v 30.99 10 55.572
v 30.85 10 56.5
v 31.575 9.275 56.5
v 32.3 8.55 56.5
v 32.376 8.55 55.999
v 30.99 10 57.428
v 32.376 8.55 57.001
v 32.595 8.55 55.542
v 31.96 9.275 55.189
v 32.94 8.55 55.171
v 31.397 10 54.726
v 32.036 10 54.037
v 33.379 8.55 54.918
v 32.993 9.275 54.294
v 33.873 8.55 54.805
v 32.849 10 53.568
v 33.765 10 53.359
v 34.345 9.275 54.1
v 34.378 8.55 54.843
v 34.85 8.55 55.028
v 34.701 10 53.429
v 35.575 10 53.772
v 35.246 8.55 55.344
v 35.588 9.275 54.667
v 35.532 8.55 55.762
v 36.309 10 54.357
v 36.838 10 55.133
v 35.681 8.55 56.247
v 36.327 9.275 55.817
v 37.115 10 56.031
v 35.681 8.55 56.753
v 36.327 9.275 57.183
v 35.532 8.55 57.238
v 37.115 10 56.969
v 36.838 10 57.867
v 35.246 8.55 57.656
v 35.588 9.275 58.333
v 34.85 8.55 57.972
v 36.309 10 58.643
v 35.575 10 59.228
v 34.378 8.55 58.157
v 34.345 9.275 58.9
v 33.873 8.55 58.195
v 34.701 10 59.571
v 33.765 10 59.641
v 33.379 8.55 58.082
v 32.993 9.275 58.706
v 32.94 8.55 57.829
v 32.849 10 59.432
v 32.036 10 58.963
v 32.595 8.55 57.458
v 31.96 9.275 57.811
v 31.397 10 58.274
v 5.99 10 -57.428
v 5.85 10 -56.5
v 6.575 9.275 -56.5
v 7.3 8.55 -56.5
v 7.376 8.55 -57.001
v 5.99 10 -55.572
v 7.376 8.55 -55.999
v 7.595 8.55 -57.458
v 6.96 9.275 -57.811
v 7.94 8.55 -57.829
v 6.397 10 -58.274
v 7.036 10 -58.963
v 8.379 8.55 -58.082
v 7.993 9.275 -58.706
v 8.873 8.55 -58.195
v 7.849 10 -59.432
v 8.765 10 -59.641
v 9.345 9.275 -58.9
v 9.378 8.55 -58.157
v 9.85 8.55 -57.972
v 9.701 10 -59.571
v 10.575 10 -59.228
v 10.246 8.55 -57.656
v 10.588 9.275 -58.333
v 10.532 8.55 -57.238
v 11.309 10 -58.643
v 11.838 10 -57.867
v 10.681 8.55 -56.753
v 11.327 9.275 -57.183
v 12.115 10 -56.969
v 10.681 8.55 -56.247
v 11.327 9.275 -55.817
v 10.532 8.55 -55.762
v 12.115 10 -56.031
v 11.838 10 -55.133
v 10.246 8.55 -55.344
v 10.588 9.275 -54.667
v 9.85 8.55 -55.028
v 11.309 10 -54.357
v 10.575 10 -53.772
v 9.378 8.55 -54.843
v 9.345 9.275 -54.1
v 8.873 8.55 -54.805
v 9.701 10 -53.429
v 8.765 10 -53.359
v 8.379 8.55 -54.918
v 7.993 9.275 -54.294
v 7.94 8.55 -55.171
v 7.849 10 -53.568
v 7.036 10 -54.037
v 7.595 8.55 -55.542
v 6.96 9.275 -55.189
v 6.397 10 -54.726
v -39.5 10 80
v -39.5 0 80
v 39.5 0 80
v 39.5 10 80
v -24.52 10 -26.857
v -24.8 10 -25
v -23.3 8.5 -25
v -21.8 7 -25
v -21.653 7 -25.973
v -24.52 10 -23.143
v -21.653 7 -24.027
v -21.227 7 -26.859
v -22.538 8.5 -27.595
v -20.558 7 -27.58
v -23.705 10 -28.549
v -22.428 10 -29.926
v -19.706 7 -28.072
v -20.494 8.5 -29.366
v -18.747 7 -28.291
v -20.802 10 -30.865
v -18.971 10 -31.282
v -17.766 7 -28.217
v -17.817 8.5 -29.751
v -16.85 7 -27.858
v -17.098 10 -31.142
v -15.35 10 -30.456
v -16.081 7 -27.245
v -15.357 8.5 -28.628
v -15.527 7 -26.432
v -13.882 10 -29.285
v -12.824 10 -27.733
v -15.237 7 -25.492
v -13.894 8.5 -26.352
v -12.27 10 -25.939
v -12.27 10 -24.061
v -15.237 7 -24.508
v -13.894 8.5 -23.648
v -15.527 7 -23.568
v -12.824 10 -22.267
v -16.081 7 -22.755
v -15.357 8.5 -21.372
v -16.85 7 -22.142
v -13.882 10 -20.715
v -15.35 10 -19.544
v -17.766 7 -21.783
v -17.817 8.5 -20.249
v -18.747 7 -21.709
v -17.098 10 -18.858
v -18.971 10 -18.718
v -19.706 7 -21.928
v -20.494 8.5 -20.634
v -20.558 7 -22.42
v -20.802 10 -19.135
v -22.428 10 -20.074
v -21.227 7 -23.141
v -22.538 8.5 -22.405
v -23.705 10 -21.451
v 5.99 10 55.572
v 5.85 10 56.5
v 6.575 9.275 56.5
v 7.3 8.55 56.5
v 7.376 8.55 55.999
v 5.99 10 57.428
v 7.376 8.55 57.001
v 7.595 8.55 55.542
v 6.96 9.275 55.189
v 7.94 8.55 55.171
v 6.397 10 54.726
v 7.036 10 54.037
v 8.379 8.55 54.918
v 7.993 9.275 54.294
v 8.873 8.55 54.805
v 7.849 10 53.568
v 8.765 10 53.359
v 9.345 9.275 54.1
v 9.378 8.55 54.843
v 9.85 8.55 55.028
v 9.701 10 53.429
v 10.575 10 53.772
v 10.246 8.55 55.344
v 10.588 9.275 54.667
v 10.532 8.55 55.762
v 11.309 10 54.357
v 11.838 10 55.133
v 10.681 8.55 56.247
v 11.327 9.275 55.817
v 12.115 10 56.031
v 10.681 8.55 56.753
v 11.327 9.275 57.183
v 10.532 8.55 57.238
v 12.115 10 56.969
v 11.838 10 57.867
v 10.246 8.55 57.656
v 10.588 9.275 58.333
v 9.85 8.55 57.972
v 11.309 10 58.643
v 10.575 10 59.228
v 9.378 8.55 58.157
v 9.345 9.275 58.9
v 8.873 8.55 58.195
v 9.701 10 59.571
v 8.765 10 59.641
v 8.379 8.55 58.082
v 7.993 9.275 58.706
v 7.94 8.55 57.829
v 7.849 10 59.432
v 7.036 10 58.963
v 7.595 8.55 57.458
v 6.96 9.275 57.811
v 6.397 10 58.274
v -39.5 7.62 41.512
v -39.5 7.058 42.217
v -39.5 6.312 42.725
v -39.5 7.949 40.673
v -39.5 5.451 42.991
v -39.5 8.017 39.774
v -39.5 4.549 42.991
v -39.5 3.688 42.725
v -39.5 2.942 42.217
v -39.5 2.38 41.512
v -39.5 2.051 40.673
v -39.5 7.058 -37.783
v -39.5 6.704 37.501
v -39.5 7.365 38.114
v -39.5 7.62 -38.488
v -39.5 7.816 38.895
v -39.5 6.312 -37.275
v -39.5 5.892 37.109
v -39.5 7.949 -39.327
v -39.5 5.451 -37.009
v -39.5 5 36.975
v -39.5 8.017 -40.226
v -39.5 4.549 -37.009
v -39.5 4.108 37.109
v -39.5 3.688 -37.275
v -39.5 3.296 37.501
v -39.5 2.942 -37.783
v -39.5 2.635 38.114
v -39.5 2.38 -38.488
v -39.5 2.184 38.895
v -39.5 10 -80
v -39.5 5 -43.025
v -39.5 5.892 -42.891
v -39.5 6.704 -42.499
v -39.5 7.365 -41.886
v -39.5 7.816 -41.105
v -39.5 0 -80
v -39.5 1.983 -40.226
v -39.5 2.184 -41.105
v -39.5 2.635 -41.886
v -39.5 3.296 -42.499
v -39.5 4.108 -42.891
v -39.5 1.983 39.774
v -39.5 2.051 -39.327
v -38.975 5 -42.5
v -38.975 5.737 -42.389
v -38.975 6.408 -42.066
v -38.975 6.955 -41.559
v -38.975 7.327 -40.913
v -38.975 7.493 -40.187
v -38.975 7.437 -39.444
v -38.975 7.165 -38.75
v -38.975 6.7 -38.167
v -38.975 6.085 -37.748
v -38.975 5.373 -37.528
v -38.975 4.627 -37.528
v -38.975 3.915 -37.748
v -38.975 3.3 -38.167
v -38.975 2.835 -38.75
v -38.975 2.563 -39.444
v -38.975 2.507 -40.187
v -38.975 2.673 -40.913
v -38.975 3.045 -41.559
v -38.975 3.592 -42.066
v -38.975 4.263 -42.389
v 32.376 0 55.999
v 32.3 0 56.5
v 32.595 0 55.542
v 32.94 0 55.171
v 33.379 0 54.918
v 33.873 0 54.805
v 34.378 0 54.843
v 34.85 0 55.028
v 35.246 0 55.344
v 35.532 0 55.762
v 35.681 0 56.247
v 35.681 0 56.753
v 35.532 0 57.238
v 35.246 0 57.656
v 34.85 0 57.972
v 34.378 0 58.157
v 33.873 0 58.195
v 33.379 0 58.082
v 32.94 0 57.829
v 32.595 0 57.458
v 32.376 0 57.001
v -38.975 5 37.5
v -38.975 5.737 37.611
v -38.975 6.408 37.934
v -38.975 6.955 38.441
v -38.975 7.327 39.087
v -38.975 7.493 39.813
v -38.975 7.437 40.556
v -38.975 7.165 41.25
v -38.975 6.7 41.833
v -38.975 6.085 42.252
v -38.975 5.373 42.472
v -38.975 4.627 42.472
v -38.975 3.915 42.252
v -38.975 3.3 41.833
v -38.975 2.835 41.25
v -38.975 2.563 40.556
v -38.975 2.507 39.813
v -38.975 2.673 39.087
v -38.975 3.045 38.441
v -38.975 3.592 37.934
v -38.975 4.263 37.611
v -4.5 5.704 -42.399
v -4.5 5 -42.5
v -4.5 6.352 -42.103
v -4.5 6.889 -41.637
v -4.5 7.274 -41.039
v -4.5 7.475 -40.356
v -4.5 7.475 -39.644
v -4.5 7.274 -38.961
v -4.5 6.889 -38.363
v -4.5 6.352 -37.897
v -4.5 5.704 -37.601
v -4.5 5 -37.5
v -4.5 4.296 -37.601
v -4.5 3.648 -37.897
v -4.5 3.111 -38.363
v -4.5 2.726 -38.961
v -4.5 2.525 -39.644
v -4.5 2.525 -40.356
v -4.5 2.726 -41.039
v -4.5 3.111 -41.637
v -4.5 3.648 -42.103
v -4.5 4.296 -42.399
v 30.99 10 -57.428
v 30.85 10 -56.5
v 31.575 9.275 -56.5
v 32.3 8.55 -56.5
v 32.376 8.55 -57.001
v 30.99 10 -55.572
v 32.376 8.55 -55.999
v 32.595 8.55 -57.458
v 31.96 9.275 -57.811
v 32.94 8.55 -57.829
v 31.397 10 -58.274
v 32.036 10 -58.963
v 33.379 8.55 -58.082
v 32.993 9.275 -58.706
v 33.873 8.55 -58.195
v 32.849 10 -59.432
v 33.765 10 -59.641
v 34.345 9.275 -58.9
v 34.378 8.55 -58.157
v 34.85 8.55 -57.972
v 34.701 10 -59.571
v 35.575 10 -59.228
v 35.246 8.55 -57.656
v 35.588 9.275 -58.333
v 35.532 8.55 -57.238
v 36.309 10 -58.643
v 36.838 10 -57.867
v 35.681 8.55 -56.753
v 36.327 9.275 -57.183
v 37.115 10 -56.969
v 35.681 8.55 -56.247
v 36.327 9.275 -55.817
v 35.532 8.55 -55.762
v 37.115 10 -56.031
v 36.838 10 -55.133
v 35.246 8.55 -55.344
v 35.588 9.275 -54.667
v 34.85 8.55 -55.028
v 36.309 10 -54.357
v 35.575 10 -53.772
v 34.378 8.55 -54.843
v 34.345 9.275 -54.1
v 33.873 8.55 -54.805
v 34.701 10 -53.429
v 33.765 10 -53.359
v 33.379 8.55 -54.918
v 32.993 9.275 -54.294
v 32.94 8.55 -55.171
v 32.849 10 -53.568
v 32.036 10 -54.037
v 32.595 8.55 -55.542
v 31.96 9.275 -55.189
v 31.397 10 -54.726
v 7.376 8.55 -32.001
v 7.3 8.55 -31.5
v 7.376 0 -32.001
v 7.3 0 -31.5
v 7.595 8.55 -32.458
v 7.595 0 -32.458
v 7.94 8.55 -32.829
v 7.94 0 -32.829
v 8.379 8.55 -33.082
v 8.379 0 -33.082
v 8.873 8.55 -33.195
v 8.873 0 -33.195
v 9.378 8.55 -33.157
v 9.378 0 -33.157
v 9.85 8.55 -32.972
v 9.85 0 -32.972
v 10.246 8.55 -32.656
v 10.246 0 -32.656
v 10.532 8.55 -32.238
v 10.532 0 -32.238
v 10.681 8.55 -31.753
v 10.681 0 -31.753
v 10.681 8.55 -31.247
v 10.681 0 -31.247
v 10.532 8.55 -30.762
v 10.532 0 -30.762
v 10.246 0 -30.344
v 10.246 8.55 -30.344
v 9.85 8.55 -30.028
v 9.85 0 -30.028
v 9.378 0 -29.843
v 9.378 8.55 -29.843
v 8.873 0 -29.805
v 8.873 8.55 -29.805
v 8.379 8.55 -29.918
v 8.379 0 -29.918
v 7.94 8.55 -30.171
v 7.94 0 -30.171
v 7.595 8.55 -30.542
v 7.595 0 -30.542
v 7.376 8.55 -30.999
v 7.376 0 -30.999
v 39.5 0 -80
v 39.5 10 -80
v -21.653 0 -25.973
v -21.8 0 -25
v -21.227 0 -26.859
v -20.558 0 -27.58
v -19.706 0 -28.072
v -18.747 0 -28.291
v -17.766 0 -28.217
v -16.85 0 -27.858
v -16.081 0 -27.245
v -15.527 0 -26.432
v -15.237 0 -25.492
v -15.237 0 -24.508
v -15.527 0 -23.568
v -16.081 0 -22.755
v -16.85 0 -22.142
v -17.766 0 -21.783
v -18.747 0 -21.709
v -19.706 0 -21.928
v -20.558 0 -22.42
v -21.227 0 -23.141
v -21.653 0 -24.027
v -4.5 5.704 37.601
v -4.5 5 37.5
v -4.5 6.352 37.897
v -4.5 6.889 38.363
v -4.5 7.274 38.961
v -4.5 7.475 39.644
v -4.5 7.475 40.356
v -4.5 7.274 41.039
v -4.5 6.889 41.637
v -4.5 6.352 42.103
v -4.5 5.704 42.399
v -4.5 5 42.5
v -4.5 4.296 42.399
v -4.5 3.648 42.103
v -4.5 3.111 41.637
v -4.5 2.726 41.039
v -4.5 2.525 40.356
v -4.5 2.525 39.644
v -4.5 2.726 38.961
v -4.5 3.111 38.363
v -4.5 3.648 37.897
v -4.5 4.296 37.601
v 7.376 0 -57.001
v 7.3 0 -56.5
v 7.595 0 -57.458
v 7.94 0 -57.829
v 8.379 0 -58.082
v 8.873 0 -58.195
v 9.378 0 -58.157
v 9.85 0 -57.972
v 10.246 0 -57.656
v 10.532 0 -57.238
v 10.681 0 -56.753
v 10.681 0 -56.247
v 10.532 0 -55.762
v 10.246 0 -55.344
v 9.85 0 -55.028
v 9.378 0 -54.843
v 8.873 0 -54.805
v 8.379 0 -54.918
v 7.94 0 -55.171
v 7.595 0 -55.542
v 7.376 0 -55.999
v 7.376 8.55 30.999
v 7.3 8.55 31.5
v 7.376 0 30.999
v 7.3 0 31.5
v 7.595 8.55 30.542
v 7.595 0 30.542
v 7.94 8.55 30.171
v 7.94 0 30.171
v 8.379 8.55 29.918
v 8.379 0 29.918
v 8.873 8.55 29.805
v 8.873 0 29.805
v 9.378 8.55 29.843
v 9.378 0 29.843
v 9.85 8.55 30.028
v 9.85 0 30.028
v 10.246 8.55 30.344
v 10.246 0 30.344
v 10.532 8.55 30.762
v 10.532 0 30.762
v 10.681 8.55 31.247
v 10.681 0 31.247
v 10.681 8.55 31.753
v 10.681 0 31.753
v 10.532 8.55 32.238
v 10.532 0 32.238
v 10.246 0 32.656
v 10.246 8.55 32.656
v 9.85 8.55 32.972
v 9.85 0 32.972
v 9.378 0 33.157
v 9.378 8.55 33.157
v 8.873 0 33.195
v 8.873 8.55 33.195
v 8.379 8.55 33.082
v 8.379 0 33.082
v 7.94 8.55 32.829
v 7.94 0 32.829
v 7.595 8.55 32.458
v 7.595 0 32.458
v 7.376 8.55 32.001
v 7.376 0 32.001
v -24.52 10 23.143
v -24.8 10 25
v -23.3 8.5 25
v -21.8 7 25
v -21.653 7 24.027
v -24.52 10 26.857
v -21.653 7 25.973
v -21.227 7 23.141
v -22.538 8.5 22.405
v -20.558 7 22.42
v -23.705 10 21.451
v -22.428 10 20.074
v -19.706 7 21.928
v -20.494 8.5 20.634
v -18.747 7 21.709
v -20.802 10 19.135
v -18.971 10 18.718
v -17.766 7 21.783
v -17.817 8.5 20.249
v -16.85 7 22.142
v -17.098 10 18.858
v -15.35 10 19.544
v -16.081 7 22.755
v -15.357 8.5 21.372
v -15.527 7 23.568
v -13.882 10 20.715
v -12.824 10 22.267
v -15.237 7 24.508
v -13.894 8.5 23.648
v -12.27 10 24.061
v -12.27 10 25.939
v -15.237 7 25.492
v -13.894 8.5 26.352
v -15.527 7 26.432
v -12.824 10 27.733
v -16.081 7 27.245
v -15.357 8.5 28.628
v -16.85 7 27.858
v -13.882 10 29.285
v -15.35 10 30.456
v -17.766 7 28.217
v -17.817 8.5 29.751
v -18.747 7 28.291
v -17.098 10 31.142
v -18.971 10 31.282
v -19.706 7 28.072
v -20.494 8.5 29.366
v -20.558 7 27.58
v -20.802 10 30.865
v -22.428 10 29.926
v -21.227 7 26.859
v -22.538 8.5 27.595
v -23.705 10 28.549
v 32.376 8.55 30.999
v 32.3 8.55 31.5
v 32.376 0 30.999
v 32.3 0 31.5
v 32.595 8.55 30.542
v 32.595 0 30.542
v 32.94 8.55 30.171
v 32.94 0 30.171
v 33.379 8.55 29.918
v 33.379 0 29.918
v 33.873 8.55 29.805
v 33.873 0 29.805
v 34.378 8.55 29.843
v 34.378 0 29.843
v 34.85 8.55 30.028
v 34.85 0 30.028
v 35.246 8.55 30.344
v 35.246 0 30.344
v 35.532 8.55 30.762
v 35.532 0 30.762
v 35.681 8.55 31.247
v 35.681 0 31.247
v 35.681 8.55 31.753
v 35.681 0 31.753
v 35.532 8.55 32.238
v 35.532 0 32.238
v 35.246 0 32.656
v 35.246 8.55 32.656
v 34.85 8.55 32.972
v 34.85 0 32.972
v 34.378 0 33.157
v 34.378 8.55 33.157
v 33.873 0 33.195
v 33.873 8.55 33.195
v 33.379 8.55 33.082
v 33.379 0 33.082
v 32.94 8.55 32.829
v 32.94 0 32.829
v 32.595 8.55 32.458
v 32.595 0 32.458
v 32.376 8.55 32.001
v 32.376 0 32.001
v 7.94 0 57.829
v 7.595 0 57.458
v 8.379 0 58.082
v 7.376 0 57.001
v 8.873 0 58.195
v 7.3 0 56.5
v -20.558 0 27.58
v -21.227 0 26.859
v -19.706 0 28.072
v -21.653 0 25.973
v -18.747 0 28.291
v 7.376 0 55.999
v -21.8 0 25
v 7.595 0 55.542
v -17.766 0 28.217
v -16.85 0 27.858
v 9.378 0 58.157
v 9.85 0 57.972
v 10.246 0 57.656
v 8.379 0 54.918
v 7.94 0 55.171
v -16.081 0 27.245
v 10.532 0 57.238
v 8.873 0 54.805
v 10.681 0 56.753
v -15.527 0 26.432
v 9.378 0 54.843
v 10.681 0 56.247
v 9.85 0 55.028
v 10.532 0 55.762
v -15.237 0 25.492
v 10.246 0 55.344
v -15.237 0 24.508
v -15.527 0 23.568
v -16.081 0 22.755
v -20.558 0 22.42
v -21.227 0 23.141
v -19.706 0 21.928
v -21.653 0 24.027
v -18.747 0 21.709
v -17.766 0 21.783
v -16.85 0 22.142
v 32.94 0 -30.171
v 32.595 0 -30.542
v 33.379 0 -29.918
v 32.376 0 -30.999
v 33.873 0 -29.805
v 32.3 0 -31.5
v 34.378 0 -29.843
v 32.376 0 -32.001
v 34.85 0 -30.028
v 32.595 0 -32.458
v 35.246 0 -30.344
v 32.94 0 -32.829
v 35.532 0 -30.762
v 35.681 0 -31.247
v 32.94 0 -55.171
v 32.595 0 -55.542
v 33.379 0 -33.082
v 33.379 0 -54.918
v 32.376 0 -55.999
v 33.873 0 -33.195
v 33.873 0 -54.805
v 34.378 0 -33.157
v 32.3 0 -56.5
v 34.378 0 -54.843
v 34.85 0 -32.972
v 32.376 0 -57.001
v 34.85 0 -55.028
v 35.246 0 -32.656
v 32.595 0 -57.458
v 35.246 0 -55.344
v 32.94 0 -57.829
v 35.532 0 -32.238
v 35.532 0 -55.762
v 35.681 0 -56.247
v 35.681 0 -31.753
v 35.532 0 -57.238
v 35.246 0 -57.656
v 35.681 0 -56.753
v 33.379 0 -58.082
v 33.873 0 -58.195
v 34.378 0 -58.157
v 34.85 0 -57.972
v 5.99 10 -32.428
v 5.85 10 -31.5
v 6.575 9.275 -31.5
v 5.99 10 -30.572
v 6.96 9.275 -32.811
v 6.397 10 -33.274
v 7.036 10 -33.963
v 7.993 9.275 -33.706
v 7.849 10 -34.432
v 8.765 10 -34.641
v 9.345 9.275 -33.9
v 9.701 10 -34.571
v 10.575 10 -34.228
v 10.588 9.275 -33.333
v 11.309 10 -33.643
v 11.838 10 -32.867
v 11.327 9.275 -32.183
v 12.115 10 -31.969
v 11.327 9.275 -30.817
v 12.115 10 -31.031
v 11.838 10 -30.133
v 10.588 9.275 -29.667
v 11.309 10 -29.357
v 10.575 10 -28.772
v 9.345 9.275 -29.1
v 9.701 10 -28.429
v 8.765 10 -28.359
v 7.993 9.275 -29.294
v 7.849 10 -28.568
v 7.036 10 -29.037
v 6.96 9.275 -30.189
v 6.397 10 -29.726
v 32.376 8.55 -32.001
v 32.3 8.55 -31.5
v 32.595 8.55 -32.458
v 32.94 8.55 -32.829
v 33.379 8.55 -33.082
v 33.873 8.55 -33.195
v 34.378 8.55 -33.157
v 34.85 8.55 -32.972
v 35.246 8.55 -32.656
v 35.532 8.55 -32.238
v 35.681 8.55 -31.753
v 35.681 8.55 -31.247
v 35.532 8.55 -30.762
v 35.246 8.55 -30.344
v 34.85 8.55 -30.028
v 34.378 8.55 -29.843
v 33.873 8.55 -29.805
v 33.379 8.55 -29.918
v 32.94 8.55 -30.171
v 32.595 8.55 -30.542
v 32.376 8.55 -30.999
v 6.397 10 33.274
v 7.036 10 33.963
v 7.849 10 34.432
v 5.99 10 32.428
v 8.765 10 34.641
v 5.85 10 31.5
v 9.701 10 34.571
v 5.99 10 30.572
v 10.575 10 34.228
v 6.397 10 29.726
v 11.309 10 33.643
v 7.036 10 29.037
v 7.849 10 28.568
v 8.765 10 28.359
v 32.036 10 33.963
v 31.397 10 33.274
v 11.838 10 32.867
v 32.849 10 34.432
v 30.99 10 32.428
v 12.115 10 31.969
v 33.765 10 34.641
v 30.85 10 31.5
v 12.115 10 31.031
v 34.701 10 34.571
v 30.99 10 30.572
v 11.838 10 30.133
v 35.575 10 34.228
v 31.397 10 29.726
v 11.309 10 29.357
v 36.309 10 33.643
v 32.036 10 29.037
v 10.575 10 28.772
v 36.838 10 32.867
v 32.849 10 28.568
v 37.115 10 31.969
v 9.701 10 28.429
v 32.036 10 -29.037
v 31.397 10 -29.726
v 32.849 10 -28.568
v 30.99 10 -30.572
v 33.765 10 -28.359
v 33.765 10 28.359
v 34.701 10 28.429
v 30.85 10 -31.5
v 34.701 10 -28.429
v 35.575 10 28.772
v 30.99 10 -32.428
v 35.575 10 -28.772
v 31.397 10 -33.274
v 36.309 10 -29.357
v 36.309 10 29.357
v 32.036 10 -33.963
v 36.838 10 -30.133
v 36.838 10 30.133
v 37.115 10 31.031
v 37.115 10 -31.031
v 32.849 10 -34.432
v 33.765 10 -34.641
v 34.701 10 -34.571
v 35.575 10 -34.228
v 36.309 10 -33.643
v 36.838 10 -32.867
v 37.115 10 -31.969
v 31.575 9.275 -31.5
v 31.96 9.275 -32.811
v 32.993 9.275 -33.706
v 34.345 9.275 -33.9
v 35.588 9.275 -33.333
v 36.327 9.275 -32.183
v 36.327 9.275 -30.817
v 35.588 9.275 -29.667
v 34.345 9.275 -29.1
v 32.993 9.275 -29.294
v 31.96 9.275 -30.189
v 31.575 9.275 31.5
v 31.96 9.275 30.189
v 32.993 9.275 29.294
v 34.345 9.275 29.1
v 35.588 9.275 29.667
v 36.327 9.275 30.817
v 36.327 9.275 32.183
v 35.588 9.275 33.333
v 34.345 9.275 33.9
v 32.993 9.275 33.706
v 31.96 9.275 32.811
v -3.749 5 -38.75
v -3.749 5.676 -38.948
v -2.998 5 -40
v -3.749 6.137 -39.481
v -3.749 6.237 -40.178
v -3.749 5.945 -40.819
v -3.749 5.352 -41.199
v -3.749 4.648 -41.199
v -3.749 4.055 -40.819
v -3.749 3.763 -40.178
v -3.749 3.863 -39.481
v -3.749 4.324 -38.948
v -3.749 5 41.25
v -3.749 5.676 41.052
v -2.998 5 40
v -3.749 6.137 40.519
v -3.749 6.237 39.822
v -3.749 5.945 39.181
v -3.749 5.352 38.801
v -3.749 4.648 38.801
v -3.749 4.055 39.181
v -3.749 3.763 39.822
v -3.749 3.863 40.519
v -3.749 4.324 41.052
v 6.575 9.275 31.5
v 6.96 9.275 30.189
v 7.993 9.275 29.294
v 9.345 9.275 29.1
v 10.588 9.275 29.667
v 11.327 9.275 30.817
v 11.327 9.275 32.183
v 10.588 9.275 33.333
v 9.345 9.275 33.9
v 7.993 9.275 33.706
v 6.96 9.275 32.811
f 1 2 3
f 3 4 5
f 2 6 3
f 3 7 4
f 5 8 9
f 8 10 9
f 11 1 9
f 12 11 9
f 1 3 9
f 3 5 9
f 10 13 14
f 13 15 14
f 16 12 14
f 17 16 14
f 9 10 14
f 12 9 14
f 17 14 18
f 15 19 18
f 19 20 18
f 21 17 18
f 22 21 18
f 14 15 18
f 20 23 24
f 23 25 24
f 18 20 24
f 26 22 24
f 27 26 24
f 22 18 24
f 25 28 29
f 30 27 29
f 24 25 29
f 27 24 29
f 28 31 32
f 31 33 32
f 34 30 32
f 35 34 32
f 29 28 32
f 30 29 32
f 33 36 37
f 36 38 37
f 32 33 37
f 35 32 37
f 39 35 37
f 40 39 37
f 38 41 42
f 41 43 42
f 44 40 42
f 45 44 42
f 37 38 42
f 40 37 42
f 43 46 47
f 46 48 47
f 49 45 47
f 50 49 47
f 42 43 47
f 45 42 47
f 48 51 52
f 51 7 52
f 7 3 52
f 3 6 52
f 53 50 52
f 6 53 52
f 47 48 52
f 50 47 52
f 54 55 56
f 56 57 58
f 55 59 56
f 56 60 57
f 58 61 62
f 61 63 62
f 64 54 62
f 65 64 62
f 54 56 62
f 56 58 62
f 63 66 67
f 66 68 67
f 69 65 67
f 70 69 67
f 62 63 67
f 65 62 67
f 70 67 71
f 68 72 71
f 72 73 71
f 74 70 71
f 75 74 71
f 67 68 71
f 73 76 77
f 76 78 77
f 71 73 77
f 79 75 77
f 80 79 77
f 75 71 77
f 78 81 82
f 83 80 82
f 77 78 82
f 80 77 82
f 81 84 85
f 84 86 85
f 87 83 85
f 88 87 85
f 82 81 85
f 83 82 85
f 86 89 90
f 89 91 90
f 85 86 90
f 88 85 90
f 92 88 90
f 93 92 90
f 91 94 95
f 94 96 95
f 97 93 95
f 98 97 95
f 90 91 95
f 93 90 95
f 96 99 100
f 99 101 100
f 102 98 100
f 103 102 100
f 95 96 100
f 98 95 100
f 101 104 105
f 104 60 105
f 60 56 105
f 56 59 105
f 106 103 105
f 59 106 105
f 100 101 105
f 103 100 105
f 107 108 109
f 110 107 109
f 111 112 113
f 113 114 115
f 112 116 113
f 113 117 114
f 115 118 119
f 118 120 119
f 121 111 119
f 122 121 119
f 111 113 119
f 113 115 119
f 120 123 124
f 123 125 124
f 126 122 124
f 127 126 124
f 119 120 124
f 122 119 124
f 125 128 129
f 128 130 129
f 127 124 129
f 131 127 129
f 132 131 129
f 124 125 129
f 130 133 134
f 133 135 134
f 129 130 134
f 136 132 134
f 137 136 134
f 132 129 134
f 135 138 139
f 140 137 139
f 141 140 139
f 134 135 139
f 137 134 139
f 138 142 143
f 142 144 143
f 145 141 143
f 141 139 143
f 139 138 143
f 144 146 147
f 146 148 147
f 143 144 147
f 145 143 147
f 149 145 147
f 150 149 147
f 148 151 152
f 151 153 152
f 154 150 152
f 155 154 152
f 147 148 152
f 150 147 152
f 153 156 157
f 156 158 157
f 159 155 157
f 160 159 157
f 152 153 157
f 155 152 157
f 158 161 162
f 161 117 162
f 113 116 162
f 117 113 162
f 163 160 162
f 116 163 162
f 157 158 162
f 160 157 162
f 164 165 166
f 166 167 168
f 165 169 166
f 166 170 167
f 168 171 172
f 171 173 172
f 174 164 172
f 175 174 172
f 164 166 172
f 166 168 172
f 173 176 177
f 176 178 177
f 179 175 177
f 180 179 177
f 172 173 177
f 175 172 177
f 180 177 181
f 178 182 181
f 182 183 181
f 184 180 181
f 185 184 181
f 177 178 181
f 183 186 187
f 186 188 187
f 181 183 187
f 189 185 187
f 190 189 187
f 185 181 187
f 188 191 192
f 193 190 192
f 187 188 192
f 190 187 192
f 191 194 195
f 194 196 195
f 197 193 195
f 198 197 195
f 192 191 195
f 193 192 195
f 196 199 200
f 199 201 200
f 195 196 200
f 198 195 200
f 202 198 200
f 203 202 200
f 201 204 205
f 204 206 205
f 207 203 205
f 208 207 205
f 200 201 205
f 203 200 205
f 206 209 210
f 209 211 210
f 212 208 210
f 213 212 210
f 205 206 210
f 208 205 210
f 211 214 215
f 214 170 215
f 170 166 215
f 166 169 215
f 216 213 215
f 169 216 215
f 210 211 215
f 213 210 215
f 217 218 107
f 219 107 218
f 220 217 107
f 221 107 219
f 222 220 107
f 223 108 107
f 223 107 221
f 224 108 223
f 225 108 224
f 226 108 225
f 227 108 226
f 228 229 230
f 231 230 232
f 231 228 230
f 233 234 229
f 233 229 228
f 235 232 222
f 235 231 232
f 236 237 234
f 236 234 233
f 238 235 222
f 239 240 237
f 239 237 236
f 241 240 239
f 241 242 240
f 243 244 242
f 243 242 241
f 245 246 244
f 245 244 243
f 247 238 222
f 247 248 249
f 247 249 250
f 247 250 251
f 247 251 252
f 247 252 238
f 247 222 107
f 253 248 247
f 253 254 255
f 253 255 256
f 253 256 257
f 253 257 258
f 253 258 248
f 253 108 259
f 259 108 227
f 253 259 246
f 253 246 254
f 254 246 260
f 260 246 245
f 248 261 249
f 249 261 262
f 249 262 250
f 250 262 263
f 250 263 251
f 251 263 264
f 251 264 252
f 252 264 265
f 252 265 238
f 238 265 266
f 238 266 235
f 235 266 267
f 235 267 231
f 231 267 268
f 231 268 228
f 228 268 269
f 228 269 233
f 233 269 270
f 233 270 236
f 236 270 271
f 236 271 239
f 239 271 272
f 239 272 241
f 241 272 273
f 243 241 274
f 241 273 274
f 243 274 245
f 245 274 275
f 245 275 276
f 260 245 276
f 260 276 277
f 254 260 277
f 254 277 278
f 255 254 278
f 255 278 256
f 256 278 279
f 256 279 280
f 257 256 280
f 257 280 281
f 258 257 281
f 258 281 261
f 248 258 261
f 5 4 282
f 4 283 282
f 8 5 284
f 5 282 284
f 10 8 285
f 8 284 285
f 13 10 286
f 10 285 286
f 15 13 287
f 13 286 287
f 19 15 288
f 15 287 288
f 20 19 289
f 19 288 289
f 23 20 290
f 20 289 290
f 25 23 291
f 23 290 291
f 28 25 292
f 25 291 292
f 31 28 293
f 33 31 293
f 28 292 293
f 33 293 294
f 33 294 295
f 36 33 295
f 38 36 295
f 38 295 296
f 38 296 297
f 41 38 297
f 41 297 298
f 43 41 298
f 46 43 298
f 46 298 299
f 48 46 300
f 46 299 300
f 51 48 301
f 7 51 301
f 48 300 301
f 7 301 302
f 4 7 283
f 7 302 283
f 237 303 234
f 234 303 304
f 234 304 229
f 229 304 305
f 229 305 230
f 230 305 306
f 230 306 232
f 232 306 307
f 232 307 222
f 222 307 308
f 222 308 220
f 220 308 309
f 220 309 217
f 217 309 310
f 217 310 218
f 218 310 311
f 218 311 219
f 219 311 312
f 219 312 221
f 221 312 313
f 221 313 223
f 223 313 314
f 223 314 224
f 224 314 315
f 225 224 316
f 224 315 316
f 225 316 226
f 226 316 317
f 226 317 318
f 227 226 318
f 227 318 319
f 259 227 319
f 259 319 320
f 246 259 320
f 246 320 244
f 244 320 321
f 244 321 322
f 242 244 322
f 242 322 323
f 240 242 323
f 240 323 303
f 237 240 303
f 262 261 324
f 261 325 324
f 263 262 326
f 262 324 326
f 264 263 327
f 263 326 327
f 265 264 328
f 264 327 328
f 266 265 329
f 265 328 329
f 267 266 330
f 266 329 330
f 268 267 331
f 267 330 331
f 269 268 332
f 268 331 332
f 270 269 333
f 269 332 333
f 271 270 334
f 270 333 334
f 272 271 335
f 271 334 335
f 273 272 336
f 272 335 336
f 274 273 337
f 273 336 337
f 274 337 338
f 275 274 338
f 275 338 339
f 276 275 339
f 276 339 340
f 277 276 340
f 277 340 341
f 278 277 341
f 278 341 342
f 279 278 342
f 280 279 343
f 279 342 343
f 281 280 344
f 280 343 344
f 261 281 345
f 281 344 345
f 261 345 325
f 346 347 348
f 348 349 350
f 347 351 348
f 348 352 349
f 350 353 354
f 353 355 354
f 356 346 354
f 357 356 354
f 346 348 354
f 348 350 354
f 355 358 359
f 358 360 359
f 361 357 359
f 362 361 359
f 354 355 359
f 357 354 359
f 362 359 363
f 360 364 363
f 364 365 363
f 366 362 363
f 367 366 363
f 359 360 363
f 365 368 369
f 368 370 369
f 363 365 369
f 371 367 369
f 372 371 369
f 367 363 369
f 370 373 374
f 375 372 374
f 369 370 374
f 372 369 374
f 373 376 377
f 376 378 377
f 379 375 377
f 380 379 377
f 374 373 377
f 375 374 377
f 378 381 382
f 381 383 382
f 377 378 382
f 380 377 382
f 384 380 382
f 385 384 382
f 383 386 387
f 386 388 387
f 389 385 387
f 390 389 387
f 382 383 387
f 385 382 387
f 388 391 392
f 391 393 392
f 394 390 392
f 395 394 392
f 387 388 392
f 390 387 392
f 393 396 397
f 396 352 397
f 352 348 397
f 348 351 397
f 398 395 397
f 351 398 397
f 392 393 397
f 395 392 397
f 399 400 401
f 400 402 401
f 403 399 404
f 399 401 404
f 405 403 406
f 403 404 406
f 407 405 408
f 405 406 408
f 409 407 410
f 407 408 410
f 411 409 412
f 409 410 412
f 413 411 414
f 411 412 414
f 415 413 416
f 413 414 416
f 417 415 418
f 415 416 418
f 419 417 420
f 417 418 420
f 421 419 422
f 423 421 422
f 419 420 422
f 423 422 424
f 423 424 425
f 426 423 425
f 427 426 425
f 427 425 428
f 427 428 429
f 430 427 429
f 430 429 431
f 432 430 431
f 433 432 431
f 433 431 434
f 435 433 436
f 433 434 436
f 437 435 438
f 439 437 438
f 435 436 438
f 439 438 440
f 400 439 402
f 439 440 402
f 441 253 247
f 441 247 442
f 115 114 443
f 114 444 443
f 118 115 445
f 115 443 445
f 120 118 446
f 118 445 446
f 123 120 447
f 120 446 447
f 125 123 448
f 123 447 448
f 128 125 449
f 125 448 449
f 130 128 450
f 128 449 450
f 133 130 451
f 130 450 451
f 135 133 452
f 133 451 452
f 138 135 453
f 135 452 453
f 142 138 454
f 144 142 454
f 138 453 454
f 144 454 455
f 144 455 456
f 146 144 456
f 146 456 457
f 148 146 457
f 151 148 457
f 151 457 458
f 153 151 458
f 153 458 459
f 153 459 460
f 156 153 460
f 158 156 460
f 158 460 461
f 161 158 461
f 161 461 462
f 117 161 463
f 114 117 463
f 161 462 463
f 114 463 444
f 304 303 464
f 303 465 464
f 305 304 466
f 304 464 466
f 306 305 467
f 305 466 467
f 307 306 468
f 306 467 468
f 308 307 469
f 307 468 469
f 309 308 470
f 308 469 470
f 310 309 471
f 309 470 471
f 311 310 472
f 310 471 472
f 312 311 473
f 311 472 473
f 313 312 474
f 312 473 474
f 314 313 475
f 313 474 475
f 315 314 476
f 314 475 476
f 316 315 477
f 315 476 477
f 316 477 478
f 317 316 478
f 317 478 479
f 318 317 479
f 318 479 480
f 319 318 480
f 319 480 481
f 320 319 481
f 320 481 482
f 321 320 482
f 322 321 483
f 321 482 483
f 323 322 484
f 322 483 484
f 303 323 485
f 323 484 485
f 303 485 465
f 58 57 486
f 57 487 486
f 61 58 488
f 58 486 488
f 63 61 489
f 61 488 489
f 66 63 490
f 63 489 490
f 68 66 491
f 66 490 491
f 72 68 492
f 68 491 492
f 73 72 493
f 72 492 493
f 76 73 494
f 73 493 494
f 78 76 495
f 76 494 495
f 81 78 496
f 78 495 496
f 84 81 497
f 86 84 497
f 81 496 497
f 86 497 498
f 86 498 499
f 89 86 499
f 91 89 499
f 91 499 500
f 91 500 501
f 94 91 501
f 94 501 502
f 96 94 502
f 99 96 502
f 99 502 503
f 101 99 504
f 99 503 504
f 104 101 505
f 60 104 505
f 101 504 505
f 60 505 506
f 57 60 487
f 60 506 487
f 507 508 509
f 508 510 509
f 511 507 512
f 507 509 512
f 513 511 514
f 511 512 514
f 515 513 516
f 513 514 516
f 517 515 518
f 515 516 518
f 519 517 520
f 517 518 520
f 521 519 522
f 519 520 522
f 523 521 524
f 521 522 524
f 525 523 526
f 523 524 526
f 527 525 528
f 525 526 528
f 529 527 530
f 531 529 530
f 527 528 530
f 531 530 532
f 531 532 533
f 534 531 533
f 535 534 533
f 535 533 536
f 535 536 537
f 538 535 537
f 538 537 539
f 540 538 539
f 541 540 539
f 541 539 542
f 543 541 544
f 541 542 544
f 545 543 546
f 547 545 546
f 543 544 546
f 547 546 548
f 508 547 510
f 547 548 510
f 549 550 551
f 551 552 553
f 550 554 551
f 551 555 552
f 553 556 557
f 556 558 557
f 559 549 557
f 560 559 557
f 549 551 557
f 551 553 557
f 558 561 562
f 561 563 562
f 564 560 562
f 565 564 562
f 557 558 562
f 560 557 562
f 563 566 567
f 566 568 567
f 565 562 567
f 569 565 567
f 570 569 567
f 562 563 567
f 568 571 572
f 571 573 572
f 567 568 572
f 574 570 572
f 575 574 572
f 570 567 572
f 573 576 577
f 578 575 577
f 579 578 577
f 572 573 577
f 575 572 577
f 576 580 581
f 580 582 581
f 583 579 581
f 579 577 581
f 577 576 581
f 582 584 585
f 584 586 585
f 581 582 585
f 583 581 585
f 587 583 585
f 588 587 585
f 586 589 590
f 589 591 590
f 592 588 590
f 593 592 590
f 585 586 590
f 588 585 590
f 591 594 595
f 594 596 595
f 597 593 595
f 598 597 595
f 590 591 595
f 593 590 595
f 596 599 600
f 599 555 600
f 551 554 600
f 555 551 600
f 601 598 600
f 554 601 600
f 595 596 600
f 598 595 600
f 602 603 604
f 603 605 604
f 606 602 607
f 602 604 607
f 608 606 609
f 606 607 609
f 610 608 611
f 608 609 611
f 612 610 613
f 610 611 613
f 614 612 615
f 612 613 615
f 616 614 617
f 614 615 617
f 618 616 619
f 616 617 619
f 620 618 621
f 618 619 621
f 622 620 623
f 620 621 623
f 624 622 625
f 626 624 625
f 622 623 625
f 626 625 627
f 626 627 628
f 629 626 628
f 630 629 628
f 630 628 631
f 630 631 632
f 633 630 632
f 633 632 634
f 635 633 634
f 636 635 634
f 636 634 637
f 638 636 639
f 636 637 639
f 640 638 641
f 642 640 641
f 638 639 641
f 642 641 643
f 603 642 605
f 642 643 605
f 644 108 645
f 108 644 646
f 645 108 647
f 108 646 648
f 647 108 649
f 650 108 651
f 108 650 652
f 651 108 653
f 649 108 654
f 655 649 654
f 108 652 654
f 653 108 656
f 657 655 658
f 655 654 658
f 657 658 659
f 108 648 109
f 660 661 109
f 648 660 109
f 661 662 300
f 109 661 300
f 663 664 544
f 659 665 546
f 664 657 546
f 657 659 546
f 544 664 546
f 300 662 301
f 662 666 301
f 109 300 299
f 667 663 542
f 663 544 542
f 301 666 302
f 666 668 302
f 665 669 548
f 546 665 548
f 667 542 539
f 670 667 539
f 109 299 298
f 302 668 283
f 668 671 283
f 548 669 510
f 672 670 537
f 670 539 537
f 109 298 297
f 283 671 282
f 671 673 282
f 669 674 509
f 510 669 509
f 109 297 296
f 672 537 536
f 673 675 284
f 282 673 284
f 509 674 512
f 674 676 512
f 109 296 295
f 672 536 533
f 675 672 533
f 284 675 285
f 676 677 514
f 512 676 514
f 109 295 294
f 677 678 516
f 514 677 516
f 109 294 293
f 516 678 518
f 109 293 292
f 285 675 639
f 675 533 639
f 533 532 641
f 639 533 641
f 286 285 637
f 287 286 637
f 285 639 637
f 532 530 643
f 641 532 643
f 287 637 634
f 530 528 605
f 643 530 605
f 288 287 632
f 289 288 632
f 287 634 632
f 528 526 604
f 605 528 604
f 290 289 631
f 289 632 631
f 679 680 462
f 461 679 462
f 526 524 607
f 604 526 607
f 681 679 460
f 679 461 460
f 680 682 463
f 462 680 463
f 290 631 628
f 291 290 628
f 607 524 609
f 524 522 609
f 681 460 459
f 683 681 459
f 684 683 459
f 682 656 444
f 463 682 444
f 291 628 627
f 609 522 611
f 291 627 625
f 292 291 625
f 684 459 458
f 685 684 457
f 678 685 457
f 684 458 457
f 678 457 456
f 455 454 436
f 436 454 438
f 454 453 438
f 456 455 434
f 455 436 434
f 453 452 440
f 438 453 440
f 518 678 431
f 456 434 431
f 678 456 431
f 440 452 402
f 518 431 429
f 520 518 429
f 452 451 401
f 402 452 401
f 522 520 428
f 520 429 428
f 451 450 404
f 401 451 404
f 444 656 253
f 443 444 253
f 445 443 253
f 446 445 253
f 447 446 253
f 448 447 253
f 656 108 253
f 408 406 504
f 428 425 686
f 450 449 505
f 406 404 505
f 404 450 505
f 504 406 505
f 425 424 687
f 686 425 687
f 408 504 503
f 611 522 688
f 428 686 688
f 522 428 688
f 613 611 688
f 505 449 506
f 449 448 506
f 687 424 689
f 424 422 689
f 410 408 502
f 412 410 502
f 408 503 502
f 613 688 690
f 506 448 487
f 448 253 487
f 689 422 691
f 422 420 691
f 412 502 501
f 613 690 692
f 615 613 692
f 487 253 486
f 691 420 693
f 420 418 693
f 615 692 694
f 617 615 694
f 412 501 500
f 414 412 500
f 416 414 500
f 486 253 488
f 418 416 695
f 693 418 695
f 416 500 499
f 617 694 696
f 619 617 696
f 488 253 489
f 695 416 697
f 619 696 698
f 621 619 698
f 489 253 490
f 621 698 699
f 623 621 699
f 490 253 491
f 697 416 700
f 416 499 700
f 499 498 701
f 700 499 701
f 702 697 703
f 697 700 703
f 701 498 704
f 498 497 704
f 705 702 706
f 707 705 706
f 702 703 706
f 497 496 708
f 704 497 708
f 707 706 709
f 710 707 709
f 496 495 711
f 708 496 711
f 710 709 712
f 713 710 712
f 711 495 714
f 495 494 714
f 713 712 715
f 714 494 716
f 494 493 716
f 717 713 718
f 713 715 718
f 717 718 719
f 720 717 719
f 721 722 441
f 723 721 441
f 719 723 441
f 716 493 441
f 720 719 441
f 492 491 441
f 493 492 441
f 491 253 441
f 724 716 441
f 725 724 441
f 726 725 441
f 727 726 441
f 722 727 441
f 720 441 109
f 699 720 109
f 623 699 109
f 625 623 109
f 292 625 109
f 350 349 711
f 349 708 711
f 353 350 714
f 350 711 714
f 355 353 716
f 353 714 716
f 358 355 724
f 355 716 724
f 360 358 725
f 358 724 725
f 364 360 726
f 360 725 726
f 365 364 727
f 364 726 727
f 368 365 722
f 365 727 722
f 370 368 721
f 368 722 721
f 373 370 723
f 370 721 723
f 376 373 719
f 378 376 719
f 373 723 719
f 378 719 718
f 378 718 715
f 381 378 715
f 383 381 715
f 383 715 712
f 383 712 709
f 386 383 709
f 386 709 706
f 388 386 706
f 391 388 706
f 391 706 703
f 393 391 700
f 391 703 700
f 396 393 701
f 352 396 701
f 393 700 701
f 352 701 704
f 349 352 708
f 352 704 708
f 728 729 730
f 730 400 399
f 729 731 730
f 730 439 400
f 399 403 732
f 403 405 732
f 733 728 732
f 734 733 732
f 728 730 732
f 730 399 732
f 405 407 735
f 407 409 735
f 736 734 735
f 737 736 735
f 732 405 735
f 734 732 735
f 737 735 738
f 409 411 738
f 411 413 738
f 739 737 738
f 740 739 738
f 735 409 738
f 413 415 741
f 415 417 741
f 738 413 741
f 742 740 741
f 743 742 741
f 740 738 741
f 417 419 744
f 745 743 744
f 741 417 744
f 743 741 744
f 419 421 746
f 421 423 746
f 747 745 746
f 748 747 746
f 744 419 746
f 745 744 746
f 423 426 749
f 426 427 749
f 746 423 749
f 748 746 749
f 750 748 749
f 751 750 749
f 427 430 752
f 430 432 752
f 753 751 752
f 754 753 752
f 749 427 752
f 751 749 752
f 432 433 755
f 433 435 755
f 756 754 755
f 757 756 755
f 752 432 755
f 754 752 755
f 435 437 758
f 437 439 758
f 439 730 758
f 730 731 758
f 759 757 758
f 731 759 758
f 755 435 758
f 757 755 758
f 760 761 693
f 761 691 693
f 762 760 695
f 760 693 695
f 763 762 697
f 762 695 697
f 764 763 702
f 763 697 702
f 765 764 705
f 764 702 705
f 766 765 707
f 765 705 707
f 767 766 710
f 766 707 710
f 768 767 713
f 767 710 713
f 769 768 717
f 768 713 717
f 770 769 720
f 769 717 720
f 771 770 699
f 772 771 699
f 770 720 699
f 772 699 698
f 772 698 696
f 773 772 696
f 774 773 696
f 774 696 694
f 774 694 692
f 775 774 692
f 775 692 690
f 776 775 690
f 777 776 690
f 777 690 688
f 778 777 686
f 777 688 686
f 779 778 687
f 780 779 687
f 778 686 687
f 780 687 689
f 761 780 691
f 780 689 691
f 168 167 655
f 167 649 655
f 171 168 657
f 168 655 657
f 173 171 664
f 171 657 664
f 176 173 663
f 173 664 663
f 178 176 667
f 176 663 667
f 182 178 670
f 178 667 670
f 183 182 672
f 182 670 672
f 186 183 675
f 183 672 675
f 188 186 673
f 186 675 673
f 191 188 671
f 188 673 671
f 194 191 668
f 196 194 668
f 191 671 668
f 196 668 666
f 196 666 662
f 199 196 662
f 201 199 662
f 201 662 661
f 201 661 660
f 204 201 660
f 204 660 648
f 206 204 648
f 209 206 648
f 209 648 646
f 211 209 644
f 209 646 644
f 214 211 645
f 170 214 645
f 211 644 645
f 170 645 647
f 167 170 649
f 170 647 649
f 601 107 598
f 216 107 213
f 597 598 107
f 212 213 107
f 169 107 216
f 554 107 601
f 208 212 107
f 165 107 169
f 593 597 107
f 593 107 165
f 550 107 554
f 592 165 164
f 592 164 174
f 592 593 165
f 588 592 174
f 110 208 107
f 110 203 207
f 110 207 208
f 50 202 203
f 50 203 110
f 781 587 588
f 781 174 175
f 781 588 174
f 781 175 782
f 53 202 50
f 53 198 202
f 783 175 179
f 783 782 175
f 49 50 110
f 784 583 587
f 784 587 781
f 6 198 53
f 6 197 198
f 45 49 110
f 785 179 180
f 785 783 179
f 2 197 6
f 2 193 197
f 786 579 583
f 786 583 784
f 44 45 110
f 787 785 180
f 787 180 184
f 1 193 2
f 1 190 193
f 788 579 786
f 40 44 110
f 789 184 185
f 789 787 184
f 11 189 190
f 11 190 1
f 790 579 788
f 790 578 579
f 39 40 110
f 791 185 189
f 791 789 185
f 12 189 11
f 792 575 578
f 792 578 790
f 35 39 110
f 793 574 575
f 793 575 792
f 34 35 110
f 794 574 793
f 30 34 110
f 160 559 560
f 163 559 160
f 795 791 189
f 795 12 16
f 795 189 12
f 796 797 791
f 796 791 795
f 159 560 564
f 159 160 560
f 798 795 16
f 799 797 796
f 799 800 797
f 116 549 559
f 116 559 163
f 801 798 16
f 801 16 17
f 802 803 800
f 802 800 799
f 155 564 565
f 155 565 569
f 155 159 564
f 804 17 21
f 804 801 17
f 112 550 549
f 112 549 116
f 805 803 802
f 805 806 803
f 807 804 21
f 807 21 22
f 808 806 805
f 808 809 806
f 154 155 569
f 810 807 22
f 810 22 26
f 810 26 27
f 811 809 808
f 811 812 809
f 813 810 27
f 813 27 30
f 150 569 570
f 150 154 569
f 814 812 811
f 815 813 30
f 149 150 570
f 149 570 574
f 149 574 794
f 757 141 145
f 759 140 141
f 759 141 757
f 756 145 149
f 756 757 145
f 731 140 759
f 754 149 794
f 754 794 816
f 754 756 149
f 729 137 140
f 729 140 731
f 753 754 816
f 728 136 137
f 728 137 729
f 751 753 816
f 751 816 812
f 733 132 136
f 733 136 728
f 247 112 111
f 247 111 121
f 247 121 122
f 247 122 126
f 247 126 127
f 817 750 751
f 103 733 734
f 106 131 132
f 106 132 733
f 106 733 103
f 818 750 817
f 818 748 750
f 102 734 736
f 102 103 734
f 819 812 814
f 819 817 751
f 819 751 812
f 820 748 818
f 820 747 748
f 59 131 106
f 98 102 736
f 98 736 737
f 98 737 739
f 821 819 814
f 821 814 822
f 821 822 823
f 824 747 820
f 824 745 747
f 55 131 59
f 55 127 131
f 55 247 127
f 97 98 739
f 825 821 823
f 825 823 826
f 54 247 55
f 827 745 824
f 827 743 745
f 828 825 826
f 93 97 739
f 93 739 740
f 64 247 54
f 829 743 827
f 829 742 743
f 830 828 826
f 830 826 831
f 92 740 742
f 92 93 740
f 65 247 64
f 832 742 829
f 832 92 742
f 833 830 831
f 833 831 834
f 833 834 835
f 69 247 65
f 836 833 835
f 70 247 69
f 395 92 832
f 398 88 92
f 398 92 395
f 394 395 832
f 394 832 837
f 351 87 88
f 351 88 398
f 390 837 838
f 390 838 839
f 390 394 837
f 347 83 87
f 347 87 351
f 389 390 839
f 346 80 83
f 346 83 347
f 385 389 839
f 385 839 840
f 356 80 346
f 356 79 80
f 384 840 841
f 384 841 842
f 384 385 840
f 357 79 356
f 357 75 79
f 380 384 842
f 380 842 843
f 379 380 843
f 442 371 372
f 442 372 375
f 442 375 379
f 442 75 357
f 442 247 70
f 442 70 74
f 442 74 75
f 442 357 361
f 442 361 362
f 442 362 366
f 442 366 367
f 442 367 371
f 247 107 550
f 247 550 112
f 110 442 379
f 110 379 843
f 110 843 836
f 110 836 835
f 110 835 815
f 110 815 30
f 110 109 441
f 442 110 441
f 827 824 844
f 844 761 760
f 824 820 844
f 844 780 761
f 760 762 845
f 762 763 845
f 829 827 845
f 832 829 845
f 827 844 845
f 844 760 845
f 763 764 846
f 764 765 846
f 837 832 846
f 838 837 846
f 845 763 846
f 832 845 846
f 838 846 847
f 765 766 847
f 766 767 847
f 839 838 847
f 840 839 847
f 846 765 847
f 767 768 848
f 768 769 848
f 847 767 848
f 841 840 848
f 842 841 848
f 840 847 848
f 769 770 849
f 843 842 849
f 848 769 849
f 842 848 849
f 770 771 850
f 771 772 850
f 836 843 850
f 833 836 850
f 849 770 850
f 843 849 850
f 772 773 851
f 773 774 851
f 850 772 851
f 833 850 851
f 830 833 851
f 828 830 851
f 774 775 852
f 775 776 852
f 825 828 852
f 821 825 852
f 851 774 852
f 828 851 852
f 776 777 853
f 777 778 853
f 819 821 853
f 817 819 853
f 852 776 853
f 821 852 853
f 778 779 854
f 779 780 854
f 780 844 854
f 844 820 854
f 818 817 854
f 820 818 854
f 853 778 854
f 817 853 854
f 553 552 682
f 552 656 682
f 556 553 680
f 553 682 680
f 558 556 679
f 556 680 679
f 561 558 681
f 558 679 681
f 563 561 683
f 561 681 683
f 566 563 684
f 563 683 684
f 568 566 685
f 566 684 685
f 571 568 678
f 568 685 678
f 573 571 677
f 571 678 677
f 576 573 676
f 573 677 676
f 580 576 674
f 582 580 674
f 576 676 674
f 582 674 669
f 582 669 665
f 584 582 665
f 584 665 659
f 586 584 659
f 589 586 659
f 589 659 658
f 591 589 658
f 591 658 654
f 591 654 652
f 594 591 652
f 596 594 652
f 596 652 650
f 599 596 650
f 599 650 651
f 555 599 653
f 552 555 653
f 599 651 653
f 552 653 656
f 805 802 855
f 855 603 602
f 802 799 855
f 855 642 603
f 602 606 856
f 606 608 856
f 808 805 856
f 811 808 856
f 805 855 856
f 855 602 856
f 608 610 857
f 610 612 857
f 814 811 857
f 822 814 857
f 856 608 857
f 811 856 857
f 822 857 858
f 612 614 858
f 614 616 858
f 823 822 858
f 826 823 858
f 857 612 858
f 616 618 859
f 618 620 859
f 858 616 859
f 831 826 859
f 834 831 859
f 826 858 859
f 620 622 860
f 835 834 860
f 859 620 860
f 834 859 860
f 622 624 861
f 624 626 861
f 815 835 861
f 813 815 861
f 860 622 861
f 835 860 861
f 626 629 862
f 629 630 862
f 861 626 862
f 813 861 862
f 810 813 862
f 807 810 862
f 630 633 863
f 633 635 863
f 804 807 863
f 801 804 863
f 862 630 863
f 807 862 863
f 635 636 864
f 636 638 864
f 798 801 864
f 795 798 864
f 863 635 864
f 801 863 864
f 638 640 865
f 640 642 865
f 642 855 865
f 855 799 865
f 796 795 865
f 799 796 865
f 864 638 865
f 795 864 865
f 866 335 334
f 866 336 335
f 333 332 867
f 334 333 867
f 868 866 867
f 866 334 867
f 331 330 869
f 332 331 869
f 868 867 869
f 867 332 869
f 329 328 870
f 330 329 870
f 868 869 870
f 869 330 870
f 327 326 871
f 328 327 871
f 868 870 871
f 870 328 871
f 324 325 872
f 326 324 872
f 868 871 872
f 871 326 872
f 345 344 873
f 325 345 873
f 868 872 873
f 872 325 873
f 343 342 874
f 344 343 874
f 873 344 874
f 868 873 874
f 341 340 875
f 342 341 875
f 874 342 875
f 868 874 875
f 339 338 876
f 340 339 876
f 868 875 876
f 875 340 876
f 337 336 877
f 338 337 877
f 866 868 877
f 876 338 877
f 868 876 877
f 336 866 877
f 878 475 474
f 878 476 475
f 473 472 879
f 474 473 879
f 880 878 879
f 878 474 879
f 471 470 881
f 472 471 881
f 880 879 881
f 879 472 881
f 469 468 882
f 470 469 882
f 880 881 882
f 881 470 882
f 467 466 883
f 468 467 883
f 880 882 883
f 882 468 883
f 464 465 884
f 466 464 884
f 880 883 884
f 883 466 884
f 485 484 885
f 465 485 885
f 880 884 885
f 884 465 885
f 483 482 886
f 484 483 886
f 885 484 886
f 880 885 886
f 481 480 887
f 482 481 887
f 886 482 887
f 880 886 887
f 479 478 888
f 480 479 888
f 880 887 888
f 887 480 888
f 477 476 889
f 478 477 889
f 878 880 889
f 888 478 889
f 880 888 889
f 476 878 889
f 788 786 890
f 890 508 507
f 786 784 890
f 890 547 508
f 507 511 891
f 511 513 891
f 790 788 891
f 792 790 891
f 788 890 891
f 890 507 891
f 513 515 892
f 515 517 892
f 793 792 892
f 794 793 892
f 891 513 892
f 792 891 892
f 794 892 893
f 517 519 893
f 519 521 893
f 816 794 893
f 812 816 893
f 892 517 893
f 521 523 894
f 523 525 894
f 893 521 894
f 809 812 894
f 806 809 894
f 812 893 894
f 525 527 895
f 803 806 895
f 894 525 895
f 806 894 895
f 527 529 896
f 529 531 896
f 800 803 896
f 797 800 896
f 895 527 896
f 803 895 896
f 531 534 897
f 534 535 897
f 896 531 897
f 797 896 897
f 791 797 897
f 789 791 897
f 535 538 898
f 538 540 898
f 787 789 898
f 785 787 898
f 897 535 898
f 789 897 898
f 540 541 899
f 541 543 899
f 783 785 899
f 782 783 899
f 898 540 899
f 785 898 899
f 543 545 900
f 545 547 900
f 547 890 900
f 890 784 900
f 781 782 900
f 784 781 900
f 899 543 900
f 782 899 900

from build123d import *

# Parameters (mm, degrees)
SKETCH_1_W                  = 79
SKETCH_1_H                  = 160
EXTRUDE_300_DEPTH           = 10
HOLE_WIZARD_M3_D            = 3.4
HOLE_WIZARD_M3_CSINK_D      = 6.3
HOLE_WIZARD_M3_CSINK_ANGLE  = 90
HOLE_WIZARD_M6_D            = 6.6
HOLE_WIZARD_M6_CSINK_D      = 12.6
HOLE_WIZARD_M6_CSINK_ANGLE  = 90
HOLE_WIZARD_M61_D           = 5
HOLE_WIZARD_M61_DEPTH       = 35
HOLE_WIZARD_M61_CSINK_D     = 6.05
HOLE_WIZARD_M61_CSINK_ANGLE = 90
HOLE_WIZARD_M61_TIP         = 1.502151548


with BuildPart() as part:
    # Эскиз1 → Extrude 300 (new body)
    with BuildSketch(Plane(origin=(0, 0, 0), x_dir=(1, 0, 0), z_dir=(0, 1, 0))):
        Rectangle(SKETCH_1_W, SKETCH_1_H)
    extrude(amount=EXTRUDE_300_DEPTH)

    # Каретки M3 (through all)
    with Locations(Plane(origin=(0, 10, 0), x_dir=(1, 0, 0), z_dir=(0, 1, 0))):
        with Locations((9, -56.5), (34, -56.5), (34, -31.5), (9, -31.5), (9, 56.5), (9, 31.5), (34, 31.5), (34, 56.5)):
            CounterSinkHole(HOLE_WIZARD_M3_D / 2, HOLE_WIZARD_M3_CSINK_D / 2, counter_sink_angle=HOLE_WIZARD_M3_CSINK_ANGLE)

    # КреплениеПлиты-M6 (through all)
    with Locations(Plane(origin=(0, 10, 0), x_dir=(1, 0, 0), z_dir=(0, 1, 0))):
        with Locations((-18.5, 25), (-18.5, -25)):
            CounterSinkHole(HOLE_WIZARD_M6_D / 2, HOLE_WIZARD_M6_CSINK_D / 2, counter_sink_angle=HOLE_WIZARD_M6_CSINK_ANGLE)

    # Отверстие обработанное метчиком M61
    with Locations(Plane.ZY.offset(39.5)):
        with Locations((-40, 5), (40, 5)):
            CounterSinkHole(HOLE_WIZARD_M61_D / 2, HOLE_WIZARD_M61_CSINK_D / 2, depth=HOLE_WIZARD_M61_DEPTH, counter_sink_angle=HOLE_WIZARD_M61_CSINK_ANGLE)
            with Locations((0, 0, -(HOLE_WIZARD_M61_DEPTH + HOLE_WIZARD_M61_TIP / 2))):  # 118° drill point
                Cone(0, HOLE_WIZARD_M61_D / 2, HOLE_WIZARD_M61_TIP, mode=Mode.SUBTRACT)


solid = part.part
